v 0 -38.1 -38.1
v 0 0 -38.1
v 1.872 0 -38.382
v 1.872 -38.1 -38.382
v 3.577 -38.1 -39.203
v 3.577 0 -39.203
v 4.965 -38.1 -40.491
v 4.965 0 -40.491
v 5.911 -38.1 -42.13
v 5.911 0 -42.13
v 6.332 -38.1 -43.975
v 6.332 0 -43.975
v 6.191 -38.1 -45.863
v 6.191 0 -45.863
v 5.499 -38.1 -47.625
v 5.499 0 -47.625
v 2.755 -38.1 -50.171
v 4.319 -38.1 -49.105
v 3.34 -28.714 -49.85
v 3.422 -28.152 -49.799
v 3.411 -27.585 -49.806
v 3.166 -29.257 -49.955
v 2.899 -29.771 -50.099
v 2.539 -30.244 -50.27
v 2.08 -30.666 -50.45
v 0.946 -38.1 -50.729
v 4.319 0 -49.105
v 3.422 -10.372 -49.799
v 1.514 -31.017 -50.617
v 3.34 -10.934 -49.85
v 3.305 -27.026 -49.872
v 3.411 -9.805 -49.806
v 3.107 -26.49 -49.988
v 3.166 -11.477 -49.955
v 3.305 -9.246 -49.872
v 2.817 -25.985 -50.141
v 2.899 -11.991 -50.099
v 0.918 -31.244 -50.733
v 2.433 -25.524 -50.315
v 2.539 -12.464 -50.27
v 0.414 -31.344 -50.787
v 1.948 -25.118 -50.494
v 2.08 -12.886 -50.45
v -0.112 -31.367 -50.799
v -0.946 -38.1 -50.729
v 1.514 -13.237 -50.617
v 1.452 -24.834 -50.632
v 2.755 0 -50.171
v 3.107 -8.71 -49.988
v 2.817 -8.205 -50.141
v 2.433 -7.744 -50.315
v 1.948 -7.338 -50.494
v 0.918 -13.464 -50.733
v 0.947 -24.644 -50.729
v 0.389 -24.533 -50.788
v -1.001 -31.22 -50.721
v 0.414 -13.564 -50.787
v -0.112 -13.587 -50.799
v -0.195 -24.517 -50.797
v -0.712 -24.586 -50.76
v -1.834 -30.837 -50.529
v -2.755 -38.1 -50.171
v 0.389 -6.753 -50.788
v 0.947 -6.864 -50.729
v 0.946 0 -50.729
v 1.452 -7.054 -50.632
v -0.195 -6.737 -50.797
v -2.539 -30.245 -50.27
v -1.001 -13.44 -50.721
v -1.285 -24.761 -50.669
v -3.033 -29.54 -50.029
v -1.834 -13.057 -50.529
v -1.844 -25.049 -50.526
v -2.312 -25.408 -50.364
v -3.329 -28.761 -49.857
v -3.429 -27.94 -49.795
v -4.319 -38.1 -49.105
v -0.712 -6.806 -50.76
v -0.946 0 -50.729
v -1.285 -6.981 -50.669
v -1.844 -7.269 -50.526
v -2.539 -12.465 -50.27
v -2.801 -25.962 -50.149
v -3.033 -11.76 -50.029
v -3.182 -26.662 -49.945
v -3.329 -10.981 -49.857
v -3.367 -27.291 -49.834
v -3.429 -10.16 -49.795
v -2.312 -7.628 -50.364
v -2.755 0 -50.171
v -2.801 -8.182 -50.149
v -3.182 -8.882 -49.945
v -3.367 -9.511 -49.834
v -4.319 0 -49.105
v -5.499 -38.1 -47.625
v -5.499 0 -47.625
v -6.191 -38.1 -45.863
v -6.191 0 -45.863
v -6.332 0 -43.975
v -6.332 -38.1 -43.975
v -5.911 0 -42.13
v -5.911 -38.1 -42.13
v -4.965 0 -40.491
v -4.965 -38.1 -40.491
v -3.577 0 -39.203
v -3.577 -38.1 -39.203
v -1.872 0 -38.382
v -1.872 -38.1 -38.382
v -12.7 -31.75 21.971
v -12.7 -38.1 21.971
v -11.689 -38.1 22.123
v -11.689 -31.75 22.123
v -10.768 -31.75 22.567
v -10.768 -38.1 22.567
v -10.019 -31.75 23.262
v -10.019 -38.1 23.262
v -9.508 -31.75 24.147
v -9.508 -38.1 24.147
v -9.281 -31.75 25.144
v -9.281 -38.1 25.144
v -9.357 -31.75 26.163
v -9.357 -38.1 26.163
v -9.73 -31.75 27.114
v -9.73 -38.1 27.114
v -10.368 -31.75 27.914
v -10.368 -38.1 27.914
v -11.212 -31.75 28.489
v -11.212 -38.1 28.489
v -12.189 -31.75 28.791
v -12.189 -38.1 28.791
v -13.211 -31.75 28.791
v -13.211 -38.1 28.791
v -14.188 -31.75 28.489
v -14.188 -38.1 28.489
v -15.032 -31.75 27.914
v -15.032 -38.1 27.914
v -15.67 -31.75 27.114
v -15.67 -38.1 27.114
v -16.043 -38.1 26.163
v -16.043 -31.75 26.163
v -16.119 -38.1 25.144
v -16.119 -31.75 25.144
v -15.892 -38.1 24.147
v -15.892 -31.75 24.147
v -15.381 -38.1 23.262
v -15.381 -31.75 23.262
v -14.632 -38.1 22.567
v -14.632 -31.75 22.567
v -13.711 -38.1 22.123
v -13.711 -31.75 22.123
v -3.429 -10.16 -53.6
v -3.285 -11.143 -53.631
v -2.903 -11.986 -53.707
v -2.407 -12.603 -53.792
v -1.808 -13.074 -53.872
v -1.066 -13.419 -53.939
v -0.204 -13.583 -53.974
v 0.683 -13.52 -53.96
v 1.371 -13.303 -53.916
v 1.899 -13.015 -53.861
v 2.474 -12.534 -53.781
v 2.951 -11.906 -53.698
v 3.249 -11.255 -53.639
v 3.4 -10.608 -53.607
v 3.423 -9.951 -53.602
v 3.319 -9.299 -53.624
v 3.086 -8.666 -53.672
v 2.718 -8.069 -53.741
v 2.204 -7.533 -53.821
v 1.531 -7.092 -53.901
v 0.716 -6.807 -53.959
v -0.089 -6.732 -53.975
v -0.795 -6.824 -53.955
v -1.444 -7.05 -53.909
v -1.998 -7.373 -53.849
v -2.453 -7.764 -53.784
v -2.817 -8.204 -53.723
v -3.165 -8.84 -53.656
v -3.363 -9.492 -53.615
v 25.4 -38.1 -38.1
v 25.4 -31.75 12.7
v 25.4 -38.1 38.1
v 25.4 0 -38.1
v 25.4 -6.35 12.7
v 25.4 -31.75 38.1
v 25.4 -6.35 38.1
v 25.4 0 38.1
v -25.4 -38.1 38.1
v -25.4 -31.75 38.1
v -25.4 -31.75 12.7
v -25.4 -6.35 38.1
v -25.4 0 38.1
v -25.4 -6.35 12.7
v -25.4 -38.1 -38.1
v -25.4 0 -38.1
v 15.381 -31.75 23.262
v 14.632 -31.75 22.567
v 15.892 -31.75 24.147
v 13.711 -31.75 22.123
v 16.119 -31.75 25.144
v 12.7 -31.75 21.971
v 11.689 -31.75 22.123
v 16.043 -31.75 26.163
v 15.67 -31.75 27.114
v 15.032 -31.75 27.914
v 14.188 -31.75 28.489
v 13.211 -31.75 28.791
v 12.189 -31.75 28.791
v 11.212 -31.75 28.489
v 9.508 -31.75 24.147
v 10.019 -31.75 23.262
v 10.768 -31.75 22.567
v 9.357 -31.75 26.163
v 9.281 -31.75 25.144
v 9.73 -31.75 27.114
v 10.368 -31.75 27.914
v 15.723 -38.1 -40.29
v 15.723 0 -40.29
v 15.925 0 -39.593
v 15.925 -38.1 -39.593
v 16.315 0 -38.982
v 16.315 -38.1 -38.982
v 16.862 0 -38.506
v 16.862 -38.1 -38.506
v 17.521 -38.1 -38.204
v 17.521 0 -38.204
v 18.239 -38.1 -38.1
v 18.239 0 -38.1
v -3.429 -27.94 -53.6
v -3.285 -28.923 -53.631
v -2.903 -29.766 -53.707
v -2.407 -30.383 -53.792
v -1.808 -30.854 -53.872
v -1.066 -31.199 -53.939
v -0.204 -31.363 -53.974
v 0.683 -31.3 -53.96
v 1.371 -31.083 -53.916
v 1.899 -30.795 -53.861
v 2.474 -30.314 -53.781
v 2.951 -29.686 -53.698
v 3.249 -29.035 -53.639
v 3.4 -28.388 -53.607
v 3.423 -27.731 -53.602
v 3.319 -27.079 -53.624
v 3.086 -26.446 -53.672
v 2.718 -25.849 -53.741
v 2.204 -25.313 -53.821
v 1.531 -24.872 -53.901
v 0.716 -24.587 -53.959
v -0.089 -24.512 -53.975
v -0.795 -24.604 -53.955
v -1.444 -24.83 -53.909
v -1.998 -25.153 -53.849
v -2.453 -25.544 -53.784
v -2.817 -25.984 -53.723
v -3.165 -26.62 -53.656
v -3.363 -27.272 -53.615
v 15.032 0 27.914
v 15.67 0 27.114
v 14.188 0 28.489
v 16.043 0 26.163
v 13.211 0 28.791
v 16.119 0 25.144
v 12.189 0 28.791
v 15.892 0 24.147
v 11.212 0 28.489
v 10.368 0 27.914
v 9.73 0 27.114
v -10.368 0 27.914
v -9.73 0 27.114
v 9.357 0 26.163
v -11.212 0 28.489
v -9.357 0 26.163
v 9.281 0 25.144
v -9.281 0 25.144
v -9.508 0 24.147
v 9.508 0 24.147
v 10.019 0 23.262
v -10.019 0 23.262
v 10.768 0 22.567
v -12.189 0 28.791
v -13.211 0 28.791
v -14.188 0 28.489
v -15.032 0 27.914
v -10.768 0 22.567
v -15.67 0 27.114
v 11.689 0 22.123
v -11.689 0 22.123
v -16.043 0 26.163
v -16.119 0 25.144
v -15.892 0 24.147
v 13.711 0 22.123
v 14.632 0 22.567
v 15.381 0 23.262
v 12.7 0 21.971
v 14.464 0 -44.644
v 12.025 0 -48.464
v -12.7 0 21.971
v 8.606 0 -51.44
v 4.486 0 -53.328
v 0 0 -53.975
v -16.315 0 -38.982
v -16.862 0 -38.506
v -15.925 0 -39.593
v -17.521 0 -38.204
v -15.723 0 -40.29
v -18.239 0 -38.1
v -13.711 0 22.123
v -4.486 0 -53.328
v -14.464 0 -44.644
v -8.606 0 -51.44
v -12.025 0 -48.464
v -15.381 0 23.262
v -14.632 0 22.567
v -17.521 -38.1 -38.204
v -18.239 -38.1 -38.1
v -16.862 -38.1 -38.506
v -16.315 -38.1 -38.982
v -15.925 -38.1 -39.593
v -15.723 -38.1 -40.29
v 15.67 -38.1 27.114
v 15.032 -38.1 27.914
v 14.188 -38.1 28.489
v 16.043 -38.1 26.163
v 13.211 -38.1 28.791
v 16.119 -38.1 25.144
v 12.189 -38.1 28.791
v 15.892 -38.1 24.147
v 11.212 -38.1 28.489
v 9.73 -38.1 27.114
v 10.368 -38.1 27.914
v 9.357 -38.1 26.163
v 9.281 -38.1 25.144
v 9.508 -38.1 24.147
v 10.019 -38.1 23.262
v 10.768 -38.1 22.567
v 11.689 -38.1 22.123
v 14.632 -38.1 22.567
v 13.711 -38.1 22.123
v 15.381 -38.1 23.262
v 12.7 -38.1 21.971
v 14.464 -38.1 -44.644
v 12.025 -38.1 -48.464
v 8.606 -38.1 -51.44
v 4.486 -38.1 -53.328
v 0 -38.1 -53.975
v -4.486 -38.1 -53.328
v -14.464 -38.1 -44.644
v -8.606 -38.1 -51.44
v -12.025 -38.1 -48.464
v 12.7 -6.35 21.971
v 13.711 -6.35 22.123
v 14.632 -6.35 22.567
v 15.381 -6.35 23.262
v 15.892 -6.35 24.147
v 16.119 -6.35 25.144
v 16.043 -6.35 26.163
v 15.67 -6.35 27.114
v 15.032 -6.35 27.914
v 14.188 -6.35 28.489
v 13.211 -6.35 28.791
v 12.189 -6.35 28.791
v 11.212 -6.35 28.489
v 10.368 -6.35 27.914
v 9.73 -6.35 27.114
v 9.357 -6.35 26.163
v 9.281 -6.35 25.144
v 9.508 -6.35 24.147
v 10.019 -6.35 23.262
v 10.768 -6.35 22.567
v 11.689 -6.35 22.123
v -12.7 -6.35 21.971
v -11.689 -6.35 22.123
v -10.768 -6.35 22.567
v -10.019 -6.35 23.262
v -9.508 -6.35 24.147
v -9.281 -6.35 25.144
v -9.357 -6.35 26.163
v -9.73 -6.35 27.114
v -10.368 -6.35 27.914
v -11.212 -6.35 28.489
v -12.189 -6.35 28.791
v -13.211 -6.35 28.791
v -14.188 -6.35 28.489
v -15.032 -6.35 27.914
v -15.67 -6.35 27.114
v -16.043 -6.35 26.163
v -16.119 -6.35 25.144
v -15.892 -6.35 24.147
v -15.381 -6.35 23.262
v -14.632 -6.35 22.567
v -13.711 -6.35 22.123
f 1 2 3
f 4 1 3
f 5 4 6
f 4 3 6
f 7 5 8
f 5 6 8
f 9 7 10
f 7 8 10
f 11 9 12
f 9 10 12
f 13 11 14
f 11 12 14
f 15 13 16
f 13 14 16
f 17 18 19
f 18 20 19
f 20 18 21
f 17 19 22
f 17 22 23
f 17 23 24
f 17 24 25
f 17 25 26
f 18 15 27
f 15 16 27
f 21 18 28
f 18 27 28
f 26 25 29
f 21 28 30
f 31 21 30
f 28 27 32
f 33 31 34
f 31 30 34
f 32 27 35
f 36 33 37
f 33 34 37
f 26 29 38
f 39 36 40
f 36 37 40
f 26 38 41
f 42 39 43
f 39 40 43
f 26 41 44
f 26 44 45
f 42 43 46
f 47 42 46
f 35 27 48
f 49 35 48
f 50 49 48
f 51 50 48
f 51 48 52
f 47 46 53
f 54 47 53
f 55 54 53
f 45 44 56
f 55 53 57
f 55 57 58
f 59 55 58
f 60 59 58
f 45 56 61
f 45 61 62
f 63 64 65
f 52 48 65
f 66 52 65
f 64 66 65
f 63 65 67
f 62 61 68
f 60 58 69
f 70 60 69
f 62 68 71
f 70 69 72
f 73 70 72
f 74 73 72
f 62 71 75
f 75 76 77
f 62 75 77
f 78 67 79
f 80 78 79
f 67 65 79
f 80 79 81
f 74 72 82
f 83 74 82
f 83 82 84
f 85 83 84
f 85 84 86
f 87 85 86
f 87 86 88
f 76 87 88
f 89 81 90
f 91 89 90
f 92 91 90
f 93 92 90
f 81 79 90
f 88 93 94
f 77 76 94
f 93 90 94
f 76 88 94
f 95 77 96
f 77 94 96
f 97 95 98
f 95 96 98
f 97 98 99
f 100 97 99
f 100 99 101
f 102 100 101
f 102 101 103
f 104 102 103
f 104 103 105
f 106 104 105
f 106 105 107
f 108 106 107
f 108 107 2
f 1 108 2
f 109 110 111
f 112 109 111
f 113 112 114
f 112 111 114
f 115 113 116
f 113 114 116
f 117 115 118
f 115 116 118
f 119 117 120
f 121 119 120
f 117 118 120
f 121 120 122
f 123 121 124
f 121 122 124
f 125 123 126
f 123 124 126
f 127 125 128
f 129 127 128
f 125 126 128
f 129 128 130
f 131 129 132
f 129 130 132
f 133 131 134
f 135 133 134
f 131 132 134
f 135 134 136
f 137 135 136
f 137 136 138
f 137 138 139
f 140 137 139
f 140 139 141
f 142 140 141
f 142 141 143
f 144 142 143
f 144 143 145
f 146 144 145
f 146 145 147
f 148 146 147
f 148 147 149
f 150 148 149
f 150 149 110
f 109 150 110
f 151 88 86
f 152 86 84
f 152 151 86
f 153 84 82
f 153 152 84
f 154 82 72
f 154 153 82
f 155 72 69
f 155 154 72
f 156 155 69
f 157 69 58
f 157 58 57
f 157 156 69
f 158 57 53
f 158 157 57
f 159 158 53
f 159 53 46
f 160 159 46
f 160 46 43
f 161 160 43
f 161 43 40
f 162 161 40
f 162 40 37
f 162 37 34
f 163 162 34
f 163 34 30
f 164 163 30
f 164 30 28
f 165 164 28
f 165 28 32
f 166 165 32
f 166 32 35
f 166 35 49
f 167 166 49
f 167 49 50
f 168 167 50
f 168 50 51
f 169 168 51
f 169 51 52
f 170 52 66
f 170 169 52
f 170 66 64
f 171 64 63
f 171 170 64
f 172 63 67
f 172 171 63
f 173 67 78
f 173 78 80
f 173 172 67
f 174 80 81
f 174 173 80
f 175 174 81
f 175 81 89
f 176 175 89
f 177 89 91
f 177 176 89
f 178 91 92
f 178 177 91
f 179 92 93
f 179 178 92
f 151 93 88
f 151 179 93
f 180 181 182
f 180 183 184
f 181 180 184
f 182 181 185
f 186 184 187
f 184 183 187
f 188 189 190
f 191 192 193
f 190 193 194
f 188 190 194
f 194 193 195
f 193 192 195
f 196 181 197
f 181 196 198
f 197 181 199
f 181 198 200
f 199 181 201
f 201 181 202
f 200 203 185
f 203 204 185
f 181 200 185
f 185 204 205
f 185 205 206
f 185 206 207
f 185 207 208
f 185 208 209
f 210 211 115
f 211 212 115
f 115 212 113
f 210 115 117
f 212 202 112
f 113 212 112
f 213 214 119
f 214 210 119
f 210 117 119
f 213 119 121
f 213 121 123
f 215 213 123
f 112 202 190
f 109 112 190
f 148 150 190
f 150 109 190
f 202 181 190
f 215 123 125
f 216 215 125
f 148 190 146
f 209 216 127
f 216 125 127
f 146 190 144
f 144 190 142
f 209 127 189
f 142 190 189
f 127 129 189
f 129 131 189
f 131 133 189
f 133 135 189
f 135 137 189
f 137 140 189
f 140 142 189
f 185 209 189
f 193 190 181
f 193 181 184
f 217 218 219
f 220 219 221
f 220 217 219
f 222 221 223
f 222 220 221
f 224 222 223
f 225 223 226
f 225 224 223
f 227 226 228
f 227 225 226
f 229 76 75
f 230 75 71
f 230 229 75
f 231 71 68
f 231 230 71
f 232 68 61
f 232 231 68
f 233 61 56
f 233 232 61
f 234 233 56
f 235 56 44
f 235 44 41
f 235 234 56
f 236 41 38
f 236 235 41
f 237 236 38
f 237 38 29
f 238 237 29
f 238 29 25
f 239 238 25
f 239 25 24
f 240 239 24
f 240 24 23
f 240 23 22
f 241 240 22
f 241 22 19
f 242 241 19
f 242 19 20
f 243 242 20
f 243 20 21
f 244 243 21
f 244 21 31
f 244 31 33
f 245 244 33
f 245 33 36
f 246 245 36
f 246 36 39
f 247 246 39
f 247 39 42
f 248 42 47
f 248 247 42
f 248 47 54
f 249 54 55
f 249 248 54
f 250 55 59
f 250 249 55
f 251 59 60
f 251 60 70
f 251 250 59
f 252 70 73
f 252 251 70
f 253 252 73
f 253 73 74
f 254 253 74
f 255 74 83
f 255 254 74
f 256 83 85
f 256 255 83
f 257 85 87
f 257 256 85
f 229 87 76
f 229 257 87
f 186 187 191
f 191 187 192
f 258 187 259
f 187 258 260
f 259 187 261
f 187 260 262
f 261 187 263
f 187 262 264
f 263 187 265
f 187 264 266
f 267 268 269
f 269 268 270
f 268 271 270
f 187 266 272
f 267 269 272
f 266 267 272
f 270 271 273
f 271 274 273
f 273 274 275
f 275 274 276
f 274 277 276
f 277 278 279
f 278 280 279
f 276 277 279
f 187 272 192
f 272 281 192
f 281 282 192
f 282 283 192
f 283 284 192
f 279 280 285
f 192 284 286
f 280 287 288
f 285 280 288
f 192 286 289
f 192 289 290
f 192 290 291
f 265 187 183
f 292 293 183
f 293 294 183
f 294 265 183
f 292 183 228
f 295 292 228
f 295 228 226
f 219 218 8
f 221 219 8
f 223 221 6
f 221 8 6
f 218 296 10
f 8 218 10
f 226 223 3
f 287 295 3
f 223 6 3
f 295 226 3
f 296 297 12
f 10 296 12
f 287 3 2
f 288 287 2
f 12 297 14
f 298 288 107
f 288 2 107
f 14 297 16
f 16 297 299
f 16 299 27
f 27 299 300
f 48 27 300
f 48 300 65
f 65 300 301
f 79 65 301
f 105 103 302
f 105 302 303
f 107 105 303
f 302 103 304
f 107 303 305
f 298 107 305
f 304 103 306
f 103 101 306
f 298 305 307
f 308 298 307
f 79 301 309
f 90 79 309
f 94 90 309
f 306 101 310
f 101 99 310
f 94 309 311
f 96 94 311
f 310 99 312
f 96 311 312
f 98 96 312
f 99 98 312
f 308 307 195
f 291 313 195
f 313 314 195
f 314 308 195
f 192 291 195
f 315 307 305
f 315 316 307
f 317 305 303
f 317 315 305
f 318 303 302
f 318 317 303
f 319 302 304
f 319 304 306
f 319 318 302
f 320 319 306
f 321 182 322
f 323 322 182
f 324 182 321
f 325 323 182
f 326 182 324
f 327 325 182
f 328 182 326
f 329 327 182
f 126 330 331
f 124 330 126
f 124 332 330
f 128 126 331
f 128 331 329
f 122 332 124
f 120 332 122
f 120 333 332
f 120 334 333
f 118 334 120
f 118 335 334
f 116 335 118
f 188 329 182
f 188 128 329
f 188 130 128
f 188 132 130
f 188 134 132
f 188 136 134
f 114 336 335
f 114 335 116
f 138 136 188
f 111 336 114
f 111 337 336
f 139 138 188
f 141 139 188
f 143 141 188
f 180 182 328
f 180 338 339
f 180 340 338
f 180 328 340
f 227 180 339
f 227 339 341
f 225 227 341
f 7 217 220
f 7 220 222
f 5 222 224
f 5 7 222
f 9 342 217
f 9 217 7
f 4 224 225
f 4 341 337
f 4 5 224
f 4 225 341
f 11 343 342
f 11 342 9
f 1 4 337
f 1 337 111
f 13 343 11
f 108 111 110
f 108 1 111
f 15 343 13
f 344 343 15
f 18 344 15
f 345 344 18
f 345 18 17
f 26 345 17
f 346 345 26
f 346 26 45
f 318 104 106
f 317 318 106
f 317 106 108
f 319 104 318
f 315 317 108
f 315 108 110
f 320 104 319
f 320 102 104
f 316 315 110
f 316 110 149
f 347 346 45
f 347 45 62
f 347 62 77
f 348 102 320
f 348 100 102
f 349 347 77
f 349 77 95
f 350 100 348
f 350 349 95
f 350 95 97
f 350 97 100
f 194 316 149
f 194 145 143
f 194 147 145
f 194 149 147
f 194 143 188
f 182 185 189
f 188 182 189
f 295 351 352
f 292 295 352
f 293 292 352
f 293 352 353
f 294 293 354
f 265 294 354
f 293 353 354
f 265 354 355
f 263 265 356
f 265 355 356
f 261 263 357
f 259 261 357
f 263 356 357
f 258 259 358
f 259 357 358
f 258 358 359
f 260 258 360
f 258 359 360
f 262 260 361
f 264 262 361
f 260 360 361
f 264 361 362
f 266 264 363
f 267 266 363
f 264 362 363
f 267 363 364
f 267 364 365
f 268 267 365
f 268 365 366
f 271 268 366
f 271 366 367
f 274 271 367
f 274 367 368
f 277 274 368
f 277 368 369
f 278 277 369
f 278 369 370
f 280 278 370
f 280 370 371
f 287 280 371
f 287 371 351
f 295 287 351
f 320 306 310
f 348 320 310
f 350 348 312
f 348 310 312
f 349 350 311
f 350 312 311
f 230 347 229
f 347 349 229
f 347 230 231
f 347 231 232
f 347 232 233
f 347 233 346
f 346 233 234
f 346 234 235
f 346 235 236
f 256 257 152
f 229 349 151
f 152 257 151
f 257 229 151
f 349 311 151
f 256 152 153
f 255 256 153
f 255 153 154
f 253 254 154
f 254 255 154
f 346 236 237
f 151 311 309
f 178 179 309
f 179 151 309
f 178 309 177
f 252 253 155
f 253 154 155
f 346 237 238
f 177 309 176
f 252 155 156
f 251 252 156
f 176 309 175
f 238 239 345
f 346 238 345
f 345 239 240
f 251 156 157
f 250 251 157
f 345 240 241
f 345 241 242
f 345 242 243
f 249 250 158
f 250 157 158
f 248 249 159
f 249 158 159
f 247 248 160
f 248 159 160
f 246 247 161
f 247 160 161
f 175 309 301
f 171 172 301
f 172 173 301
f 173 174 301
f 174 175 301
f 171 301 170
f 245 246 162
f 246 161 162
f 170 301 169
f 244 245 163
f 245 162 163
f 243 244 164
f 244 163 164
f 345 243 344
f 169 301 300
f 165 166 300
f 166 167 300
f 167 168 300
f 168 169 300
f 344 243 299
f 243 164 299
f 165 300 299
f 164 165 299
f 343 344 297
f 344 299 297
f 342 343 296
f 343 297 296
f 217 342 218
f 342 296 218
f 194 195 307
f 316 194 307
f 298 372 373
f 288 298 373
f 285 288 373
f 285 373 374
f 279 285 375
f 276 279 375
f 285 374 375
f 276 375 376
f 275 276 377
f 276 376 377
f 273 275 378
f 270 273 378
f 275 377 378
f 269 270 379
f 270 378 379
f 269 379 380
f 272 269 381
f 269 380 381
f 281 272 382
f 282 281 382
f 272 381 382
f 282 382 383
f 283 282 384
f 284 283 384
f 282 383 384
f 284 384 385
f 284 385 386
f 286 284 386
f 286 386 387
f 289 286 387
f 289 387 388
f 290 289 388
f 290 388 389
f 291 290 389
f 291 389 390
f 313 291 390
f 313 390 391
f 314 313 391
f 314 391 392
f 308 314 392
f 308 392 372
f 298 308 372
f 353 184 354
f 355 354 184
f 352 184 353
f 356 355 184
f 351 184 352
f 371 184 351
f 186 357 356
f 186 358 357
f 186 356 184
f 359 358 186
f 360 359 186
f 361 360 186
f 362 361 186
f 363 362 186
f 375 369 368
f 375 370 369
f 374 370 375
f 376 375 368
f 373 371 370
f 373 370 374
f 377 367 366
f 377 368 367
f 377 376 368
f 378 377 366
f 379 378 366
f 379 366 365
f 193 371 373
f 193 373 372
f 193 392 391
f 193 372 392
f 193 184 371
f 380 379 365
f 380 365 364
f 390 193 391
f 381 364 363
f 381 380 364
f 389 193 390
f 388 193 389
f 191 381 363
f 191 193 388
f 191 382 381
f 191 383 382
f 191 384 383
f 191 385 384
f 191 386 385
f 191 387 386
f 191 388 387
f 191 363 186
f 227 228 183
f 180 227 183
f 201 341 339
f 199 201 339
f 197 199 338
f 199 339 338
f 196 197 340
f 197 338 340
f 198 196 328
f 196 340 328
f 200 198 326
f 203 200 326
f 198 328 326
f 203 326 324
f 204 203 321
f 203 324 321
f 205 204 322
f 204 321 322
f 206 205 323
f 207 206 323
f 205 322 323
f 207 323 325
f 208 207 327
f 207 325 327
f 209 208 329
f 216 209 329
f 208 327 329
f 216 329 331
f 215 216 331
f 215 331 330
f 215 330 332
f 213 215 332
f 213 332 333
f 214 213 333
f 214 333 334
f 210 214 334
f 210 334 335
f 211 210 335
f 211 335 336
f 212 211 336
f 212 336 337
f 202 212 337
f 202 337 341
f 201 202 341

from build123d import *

# Parameters (mm, degrees)
SKETCH1_R           = 6.35
BOSS_EXTRUDE1_DEPTH = 38.1
SKETCH6_W           = 25.4
SKETCH6_H           = 25.4
CUT_EXTRUDE3_DEPTH  = 50.8
SKETCH7_R           = 3.429
CUT_EXTRUDE4_DEPTH  = 71.781852371
FILLET1_R           = 2.54
SKETCH10_R          = 3.429
CUT_EXTRUDE5_DEPTH  = 47.752


with BuildPart() as part:
    # Sketch1 → Boss-Extrude1 (new body)
    with BuildSketch(Plane(origin=(0, 0, 0), x_dir=(1, 0, 0), z_dir=(0, 1, 0))):
        with BuildLine():
            Line((-25.4, 38.1), (-15.875, 38.1))
            ThreePointArc((-15.875, 38.1), (0, 53.975), (15.875, 38.1))
            Line((15.875, 38.1), (25.4, 38.1))
            Line((25.4, 38.1), (25.4, -38.1))
            Line((25.4, -38.1), (-25.4, -38.1))
            Line((-25.4, -38.1), (-25.4, 38.1))
        make_face()
        with Locations(Location((0, 44.45, 0), (0, 0, 270))):
            Circle(SKETCH1_R, mode=Mode.SUBTRACT)
    extrude(amount=-BOSS_EXTRUDE1_DEPTH)

    # Sketch6 → Cut-Extrude3 (cut)
    with BuildSketch(Plane.ZY.offset(25.4)):
        with Locations((25.4, -19.05)):
            Rectangle(SKETCH6_W, SKETCH6_H)
    extrude(amount=-CUT_EXTRUDE3_DEPTH, mode=Mode.SUBTRACT)

    # Sketch7 → Cut-Extrude4 (cut, through all)
    with BuildSketch(Plane(origin=(0, -38.1, 0), x_dir=(-1, 0, 0), z_dir=(0, -1, 0))):
        with Locations(Location((12.7, -25.4, 0), (0, 0, 90))):
            Circle(SKETCH7_R)
        with Locations(Location((-12.7, -25.4, 0), (0, 0, 90))):
            Circle(SKETCH7_R)
    extrude(amount=-CUT_EXTRUDE4_DEPTH, mode=Mode.SUBTRACT)

    # Fillet1
    fillet1_edges = [part.edges().sort_by_distance(p)[0] for p in [
        (-15.875, -19.05, -38.1),
        (15.875, -19.05, -38.1),
    ]]
    fillet(fillet1_edges, radius=FILLET1_R)

    # Sketch10 → Cut-Extrude5 (cut)
    with BuildSketch(Plane.XY.offset(-88.9)):
        with Locations(Location((0, -27.94, 0), (0, 0, 180))):
            Circle(SKETCH10_R)
        with Locations(Location((0, -10.16, 0), (0, 0, 180))):
            Circle(SKETCH10_R)
    extrude(amount=CUT_EXTRUDE5_DEPTH, mode=Mode.SUBTRACT)


solid = part.part
